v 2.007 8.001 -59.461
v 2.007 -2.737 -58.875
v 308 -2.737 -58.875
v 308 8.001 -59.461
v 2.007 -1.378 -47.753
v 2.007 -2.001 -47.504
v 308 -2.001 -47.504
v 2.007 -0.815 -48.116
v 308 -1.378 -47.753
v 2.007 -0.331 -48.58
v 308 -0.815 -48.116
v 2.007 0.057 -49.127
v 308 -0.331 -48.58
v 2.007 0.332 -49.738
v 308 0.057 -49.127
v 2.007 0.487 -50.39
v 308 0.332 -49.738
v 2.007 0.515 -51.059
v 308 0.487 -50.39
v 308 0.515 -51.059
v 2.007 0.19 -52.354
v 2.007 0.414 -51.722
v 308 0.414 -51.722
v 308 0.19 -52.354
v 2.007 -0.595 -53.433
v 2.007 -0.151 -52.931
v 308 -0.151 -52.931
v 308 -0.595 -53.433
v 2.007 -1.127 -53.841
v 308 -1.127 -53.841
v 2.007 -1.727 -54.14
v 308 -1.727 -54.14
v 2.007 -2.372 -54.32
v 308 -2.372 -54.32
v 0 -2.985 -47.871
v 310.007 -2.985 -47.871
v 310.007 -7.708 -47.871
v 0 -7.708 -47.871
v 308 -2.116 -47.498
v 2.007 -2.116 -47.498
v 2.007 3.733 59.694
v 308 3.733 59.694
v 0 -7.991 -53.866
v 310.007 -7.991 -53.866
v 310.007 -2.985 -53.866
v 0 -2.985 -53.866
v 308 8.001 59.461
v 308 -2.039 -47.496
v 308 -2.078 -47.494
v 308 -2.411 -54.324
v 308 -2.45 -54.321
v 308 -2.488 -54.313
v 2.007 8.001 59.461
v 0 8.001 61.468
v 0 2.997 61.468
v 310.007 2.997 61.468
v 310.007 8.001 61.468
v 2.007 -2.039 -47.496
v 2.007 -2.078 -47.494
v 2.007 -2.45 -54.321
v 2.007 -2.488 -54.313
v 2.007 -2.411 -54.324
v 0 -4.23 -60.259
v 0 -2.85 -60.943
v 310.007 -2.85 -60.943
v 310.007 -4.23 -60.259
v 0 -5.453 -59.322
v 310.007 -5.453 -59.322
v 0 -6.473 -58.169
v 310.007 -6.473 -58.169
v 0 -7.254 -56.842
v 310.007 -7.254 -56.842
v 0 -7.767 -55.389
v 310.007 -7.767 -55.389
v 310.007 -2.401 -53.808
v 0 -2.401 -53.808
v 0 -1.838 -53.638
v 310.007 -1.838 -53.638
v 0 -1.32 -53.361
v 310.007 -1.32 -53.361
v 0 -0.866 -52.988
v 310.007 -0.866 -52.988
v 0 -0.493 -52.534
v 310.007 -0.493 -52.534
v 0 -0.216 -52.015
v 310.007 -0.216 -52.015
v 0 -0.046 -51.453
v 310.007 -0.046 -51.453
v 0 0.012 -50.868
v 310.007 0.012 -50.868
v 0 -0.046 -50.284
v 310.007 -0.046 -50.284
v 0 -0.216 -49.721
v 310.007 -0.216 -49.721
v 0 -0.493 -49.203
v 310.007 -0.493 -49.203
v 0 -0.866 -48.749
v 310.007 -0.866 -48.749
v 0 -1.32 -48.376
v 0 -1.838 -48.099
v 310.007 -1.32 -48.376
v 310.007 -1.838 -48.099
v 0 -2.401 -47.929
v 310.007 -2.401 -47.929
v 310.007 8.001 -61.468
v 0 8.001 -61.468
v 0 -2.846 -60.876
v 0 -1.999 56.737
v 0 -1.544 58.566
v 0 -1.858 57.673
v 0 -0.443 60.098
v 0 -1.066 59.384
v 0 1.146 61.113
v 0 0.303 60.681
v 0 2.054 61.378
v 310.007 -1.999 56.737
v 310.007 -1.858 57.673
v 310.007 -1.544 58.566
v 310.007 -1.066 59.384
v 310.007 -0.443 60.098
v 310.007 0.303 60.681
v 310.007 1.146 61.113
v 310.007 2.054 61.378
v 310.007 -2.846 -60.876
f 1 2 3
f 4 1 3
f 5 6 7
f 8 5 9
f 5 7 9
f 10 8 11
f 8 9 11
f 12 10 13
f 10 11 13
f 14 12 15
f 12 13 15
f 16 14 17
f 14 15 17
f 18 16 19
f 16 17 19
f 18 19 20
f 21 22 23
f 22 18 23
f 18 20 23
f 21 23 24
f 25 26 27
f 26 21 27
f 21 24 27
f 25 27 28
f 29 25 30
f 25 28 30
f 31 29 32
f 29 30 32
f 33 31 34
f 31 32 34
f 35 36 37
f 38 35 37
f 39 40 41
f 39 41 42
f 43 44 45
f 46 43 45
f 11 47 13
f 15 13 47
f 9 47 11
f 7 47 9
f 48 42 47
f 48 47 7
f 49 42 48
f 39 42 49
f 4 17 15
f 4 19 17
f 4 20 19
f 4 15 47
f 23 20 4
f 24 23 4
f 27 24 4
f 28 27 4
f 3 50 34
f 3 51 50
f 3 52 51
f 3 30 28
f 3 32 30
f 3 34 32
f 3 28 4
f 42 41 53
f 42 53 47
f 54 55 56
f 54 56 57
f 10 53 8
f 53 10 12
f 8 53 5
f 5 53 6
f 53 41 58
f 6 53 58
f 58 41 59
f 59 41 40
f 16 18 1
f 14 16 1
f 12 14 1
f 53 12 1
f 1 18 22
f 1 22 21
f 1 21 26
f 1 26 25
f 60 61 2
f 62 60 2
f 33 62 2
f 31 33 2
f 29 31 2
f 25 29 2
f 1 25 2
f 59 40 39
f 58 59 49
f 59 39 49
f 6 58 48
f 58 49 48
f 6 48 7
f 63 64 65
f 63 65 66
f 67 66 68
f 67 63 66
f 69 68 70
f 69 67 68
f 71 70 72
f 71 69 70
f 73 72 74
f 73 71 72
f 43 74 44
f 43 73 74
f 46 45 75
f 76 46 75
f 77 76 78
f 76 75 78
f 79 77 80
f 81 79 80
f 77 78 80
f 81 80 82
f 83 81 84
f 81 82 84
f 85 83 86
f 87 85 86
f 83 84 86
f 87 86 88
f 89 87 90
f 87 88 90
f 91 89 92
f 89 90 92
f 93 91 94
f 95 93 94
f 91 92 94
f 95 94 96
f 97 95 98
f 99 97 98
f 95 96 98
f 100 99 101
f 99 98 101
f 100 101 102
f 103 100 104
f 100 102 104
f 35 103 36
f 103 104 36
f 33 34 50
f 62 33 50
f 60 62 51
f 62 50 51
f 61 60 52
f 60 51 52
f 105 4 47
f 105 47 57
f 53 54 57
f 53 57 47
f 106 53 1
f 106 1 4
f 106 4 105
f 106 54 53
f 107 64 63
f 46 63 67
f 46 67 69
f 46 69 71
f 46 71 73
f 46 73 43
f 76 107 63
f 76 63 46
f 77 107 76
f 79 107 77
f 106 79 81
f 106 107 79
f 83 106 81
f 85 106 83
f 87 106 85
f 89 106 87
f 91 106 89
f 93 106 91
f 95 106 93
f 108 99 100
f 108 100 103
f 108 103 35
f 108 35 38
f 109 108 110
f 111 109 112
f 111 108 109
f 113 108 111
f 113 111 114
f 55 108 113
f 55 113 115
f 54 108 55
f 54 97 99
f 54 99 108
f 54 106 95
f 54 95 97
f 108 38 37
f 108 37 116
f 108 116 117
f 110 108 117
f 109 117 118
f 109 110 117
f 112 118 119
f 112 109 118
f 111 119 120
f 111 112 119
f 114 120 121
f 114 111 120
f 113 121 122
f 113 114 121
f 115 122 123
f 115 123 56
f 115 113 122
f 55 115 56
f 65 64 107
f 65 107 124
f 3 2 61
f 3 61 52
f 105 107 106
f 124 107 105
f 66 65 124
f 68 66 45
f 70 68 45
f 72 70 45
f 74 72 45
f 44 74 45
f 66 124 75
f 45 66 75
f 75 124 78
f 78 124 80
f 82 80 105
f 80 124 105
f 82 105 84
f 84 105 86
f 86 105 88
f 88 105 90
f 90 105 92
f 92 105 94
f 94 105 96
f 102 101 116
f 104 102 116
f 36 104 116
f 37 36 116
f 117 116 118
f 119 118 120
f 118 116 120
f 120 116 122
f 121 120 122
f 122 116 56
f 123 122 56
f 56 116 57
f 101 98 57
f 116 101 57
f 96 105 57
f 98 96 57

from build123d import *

# Parameters (mm, degrees)
SALIENTE_EXTRUIR1_DEPTH     = 310.007
CORTAR_EXTRUIR1_START       = 0.474917769
CORTAR_EXTRUIR1_OUTLINE_W   = 313
CORTAR_EXTRUIR1_OUTLINE_H   = 2.059275456
CORTAR_EXTRUIR1_OUTLINE_W_2 = 305.9938
CORTAR_EXTRUIR1_OUTLINE_H_2 = 118.74613036
CORTAR_EXTRUIR1_DEPTH       = 10.863473519
CORTAR_EXTRUIR2_DEPTH       = 317.143434336
SALIENTE_EXTRUIR2_REACH     = 316.176


# Read off the part's stored shape, not the designer's step: Cortar-Extruir1
with BuildPart() as part:
    # Croquis1 → Saliente-Extruir1 (new body)
    with BuildSketch(Plane(origin=(0, 0, 0), x_dir=(0, 0, -1), z_dir=(1, 0, 0))):
        with BuildLine():
            Line((-61.468, 8.001), (61.468, 8.001))
            Line((61.468, 8.001), (61.468, 0))
            ThreePointArc((61.468, 0), (58.968267477, -5.809652067), (53.031040334, -7.989113854))
            Line((53.031040334, -7.989113854), (-56.736847791, -1.999166442))
            ThreePointArc((-56.736847791, -1.999166442), (-60.09753796, -0.443275216), (-61.468, 2.9972))
            Line((-61.468, 2.9972), (-61.468, 8.001))
        make_face()
    extrude(amount=SALIENTE_EXTRUIR1_DEPTH)

    # Cortar-Extruir1 outline → Cortar-Extruir1 (cut)
    with BuildSketch(Plane(origin=(0, 0, 0), x_dir=(1, 0, 0), z_dir=(0, 0.9985144174273646, -0.054488147240394726)).offset(CORTAR_EXTRUIR1_START)):
        with Locations((155.5, 61.970362272)):
            Rectangle(CORTAR_EXTRUIR1_OUTLINE_W, CORTAR_EXTRUIR1_OUTLINE_H)
        with Locations((155.0035, -0.435959666)):
            Rectangle(CORTAR_EXTRUIR1_OUTLINE_W_2, CORTAR_EXTRUIR1_OUTLINE_H_2)
    extrude(amount=CORTAR_EXTRUIR1_DEPTH, mode=Mode.SUBTRACT)

    # Croquis3 → Cortar-Extruir2 (cut, through all)
    with BuildSketch(Plane(origin=(310.007, 0, 0), x_dir=(0, 0, -1), z_dir=(1, 0, 0))):
        with BuildLine():
            Line((47.871269455, -2.985313854), (47.871269455, -7.707549211))
            Line((47.871269455, -7.707549211), (53.031040334, -7.989113854))
            ThreePointArc((53.031040334, -7.989113854), (53.448329481, -8.000978216), (53.865669455, -7.991061486))
            Line((53.865669455, -7.991061486), (53.865669455, -2.985313854))
            ThreePointArc((53.865669455, -2.985313854), (50.868469455, 0.011886146), (47.871269455, -2.985313854))
        make_face()
    extrude(amount=-CORTAR_EXTRUIR2_DEPTH, mode=Mode.SUBTRACT)

    # Croquis4 → Saliente-Extruir2 (add, up to next)
    with BuildSketch(Plane.ZY.offset(-308.0004), mode=Mode.PRIVATE) as saliente_extruir2_sk1:
        with BuildLine():
            ThreePointArc((-54.319674223, -2.372441361), (-54.323209583, -2.4306924), (-54.313356663, -2.488212852))
            Line((-54.313356663, -2.488212852), (-53.819499619, -2.461263461))
            ThreePointArc((-53.819499619, -2.461263461), (-51.03178133, 0.007433558), (-47.991986492, -2.143260648))
            Line((-47.991986492, -2.143260648), (-47.498129447, -2.116311258))
            ThreePointArc((-47.498129447, -2.116311258), (-47.494594087, -2.058060218), (-47.504447006, -2.000539766))
            ThreePointArc((-47.504447006, -2.000539766), (-51.059461309, 0.514678882), (-54.319674223, -2.372441361))
        make_face()
    saliente_extruir2_tool1 = extrude(saliente_extruir2_sk1.sketch, amount=SALIENTE_EXTRUIR2_REACH, mode=Mode.PRIVATE) - part.part
    add(saliente_extruir2_tool1.solids().sort_by_distance((308.0004, 0.440165, -51.055395))[0])


solid = part.part
